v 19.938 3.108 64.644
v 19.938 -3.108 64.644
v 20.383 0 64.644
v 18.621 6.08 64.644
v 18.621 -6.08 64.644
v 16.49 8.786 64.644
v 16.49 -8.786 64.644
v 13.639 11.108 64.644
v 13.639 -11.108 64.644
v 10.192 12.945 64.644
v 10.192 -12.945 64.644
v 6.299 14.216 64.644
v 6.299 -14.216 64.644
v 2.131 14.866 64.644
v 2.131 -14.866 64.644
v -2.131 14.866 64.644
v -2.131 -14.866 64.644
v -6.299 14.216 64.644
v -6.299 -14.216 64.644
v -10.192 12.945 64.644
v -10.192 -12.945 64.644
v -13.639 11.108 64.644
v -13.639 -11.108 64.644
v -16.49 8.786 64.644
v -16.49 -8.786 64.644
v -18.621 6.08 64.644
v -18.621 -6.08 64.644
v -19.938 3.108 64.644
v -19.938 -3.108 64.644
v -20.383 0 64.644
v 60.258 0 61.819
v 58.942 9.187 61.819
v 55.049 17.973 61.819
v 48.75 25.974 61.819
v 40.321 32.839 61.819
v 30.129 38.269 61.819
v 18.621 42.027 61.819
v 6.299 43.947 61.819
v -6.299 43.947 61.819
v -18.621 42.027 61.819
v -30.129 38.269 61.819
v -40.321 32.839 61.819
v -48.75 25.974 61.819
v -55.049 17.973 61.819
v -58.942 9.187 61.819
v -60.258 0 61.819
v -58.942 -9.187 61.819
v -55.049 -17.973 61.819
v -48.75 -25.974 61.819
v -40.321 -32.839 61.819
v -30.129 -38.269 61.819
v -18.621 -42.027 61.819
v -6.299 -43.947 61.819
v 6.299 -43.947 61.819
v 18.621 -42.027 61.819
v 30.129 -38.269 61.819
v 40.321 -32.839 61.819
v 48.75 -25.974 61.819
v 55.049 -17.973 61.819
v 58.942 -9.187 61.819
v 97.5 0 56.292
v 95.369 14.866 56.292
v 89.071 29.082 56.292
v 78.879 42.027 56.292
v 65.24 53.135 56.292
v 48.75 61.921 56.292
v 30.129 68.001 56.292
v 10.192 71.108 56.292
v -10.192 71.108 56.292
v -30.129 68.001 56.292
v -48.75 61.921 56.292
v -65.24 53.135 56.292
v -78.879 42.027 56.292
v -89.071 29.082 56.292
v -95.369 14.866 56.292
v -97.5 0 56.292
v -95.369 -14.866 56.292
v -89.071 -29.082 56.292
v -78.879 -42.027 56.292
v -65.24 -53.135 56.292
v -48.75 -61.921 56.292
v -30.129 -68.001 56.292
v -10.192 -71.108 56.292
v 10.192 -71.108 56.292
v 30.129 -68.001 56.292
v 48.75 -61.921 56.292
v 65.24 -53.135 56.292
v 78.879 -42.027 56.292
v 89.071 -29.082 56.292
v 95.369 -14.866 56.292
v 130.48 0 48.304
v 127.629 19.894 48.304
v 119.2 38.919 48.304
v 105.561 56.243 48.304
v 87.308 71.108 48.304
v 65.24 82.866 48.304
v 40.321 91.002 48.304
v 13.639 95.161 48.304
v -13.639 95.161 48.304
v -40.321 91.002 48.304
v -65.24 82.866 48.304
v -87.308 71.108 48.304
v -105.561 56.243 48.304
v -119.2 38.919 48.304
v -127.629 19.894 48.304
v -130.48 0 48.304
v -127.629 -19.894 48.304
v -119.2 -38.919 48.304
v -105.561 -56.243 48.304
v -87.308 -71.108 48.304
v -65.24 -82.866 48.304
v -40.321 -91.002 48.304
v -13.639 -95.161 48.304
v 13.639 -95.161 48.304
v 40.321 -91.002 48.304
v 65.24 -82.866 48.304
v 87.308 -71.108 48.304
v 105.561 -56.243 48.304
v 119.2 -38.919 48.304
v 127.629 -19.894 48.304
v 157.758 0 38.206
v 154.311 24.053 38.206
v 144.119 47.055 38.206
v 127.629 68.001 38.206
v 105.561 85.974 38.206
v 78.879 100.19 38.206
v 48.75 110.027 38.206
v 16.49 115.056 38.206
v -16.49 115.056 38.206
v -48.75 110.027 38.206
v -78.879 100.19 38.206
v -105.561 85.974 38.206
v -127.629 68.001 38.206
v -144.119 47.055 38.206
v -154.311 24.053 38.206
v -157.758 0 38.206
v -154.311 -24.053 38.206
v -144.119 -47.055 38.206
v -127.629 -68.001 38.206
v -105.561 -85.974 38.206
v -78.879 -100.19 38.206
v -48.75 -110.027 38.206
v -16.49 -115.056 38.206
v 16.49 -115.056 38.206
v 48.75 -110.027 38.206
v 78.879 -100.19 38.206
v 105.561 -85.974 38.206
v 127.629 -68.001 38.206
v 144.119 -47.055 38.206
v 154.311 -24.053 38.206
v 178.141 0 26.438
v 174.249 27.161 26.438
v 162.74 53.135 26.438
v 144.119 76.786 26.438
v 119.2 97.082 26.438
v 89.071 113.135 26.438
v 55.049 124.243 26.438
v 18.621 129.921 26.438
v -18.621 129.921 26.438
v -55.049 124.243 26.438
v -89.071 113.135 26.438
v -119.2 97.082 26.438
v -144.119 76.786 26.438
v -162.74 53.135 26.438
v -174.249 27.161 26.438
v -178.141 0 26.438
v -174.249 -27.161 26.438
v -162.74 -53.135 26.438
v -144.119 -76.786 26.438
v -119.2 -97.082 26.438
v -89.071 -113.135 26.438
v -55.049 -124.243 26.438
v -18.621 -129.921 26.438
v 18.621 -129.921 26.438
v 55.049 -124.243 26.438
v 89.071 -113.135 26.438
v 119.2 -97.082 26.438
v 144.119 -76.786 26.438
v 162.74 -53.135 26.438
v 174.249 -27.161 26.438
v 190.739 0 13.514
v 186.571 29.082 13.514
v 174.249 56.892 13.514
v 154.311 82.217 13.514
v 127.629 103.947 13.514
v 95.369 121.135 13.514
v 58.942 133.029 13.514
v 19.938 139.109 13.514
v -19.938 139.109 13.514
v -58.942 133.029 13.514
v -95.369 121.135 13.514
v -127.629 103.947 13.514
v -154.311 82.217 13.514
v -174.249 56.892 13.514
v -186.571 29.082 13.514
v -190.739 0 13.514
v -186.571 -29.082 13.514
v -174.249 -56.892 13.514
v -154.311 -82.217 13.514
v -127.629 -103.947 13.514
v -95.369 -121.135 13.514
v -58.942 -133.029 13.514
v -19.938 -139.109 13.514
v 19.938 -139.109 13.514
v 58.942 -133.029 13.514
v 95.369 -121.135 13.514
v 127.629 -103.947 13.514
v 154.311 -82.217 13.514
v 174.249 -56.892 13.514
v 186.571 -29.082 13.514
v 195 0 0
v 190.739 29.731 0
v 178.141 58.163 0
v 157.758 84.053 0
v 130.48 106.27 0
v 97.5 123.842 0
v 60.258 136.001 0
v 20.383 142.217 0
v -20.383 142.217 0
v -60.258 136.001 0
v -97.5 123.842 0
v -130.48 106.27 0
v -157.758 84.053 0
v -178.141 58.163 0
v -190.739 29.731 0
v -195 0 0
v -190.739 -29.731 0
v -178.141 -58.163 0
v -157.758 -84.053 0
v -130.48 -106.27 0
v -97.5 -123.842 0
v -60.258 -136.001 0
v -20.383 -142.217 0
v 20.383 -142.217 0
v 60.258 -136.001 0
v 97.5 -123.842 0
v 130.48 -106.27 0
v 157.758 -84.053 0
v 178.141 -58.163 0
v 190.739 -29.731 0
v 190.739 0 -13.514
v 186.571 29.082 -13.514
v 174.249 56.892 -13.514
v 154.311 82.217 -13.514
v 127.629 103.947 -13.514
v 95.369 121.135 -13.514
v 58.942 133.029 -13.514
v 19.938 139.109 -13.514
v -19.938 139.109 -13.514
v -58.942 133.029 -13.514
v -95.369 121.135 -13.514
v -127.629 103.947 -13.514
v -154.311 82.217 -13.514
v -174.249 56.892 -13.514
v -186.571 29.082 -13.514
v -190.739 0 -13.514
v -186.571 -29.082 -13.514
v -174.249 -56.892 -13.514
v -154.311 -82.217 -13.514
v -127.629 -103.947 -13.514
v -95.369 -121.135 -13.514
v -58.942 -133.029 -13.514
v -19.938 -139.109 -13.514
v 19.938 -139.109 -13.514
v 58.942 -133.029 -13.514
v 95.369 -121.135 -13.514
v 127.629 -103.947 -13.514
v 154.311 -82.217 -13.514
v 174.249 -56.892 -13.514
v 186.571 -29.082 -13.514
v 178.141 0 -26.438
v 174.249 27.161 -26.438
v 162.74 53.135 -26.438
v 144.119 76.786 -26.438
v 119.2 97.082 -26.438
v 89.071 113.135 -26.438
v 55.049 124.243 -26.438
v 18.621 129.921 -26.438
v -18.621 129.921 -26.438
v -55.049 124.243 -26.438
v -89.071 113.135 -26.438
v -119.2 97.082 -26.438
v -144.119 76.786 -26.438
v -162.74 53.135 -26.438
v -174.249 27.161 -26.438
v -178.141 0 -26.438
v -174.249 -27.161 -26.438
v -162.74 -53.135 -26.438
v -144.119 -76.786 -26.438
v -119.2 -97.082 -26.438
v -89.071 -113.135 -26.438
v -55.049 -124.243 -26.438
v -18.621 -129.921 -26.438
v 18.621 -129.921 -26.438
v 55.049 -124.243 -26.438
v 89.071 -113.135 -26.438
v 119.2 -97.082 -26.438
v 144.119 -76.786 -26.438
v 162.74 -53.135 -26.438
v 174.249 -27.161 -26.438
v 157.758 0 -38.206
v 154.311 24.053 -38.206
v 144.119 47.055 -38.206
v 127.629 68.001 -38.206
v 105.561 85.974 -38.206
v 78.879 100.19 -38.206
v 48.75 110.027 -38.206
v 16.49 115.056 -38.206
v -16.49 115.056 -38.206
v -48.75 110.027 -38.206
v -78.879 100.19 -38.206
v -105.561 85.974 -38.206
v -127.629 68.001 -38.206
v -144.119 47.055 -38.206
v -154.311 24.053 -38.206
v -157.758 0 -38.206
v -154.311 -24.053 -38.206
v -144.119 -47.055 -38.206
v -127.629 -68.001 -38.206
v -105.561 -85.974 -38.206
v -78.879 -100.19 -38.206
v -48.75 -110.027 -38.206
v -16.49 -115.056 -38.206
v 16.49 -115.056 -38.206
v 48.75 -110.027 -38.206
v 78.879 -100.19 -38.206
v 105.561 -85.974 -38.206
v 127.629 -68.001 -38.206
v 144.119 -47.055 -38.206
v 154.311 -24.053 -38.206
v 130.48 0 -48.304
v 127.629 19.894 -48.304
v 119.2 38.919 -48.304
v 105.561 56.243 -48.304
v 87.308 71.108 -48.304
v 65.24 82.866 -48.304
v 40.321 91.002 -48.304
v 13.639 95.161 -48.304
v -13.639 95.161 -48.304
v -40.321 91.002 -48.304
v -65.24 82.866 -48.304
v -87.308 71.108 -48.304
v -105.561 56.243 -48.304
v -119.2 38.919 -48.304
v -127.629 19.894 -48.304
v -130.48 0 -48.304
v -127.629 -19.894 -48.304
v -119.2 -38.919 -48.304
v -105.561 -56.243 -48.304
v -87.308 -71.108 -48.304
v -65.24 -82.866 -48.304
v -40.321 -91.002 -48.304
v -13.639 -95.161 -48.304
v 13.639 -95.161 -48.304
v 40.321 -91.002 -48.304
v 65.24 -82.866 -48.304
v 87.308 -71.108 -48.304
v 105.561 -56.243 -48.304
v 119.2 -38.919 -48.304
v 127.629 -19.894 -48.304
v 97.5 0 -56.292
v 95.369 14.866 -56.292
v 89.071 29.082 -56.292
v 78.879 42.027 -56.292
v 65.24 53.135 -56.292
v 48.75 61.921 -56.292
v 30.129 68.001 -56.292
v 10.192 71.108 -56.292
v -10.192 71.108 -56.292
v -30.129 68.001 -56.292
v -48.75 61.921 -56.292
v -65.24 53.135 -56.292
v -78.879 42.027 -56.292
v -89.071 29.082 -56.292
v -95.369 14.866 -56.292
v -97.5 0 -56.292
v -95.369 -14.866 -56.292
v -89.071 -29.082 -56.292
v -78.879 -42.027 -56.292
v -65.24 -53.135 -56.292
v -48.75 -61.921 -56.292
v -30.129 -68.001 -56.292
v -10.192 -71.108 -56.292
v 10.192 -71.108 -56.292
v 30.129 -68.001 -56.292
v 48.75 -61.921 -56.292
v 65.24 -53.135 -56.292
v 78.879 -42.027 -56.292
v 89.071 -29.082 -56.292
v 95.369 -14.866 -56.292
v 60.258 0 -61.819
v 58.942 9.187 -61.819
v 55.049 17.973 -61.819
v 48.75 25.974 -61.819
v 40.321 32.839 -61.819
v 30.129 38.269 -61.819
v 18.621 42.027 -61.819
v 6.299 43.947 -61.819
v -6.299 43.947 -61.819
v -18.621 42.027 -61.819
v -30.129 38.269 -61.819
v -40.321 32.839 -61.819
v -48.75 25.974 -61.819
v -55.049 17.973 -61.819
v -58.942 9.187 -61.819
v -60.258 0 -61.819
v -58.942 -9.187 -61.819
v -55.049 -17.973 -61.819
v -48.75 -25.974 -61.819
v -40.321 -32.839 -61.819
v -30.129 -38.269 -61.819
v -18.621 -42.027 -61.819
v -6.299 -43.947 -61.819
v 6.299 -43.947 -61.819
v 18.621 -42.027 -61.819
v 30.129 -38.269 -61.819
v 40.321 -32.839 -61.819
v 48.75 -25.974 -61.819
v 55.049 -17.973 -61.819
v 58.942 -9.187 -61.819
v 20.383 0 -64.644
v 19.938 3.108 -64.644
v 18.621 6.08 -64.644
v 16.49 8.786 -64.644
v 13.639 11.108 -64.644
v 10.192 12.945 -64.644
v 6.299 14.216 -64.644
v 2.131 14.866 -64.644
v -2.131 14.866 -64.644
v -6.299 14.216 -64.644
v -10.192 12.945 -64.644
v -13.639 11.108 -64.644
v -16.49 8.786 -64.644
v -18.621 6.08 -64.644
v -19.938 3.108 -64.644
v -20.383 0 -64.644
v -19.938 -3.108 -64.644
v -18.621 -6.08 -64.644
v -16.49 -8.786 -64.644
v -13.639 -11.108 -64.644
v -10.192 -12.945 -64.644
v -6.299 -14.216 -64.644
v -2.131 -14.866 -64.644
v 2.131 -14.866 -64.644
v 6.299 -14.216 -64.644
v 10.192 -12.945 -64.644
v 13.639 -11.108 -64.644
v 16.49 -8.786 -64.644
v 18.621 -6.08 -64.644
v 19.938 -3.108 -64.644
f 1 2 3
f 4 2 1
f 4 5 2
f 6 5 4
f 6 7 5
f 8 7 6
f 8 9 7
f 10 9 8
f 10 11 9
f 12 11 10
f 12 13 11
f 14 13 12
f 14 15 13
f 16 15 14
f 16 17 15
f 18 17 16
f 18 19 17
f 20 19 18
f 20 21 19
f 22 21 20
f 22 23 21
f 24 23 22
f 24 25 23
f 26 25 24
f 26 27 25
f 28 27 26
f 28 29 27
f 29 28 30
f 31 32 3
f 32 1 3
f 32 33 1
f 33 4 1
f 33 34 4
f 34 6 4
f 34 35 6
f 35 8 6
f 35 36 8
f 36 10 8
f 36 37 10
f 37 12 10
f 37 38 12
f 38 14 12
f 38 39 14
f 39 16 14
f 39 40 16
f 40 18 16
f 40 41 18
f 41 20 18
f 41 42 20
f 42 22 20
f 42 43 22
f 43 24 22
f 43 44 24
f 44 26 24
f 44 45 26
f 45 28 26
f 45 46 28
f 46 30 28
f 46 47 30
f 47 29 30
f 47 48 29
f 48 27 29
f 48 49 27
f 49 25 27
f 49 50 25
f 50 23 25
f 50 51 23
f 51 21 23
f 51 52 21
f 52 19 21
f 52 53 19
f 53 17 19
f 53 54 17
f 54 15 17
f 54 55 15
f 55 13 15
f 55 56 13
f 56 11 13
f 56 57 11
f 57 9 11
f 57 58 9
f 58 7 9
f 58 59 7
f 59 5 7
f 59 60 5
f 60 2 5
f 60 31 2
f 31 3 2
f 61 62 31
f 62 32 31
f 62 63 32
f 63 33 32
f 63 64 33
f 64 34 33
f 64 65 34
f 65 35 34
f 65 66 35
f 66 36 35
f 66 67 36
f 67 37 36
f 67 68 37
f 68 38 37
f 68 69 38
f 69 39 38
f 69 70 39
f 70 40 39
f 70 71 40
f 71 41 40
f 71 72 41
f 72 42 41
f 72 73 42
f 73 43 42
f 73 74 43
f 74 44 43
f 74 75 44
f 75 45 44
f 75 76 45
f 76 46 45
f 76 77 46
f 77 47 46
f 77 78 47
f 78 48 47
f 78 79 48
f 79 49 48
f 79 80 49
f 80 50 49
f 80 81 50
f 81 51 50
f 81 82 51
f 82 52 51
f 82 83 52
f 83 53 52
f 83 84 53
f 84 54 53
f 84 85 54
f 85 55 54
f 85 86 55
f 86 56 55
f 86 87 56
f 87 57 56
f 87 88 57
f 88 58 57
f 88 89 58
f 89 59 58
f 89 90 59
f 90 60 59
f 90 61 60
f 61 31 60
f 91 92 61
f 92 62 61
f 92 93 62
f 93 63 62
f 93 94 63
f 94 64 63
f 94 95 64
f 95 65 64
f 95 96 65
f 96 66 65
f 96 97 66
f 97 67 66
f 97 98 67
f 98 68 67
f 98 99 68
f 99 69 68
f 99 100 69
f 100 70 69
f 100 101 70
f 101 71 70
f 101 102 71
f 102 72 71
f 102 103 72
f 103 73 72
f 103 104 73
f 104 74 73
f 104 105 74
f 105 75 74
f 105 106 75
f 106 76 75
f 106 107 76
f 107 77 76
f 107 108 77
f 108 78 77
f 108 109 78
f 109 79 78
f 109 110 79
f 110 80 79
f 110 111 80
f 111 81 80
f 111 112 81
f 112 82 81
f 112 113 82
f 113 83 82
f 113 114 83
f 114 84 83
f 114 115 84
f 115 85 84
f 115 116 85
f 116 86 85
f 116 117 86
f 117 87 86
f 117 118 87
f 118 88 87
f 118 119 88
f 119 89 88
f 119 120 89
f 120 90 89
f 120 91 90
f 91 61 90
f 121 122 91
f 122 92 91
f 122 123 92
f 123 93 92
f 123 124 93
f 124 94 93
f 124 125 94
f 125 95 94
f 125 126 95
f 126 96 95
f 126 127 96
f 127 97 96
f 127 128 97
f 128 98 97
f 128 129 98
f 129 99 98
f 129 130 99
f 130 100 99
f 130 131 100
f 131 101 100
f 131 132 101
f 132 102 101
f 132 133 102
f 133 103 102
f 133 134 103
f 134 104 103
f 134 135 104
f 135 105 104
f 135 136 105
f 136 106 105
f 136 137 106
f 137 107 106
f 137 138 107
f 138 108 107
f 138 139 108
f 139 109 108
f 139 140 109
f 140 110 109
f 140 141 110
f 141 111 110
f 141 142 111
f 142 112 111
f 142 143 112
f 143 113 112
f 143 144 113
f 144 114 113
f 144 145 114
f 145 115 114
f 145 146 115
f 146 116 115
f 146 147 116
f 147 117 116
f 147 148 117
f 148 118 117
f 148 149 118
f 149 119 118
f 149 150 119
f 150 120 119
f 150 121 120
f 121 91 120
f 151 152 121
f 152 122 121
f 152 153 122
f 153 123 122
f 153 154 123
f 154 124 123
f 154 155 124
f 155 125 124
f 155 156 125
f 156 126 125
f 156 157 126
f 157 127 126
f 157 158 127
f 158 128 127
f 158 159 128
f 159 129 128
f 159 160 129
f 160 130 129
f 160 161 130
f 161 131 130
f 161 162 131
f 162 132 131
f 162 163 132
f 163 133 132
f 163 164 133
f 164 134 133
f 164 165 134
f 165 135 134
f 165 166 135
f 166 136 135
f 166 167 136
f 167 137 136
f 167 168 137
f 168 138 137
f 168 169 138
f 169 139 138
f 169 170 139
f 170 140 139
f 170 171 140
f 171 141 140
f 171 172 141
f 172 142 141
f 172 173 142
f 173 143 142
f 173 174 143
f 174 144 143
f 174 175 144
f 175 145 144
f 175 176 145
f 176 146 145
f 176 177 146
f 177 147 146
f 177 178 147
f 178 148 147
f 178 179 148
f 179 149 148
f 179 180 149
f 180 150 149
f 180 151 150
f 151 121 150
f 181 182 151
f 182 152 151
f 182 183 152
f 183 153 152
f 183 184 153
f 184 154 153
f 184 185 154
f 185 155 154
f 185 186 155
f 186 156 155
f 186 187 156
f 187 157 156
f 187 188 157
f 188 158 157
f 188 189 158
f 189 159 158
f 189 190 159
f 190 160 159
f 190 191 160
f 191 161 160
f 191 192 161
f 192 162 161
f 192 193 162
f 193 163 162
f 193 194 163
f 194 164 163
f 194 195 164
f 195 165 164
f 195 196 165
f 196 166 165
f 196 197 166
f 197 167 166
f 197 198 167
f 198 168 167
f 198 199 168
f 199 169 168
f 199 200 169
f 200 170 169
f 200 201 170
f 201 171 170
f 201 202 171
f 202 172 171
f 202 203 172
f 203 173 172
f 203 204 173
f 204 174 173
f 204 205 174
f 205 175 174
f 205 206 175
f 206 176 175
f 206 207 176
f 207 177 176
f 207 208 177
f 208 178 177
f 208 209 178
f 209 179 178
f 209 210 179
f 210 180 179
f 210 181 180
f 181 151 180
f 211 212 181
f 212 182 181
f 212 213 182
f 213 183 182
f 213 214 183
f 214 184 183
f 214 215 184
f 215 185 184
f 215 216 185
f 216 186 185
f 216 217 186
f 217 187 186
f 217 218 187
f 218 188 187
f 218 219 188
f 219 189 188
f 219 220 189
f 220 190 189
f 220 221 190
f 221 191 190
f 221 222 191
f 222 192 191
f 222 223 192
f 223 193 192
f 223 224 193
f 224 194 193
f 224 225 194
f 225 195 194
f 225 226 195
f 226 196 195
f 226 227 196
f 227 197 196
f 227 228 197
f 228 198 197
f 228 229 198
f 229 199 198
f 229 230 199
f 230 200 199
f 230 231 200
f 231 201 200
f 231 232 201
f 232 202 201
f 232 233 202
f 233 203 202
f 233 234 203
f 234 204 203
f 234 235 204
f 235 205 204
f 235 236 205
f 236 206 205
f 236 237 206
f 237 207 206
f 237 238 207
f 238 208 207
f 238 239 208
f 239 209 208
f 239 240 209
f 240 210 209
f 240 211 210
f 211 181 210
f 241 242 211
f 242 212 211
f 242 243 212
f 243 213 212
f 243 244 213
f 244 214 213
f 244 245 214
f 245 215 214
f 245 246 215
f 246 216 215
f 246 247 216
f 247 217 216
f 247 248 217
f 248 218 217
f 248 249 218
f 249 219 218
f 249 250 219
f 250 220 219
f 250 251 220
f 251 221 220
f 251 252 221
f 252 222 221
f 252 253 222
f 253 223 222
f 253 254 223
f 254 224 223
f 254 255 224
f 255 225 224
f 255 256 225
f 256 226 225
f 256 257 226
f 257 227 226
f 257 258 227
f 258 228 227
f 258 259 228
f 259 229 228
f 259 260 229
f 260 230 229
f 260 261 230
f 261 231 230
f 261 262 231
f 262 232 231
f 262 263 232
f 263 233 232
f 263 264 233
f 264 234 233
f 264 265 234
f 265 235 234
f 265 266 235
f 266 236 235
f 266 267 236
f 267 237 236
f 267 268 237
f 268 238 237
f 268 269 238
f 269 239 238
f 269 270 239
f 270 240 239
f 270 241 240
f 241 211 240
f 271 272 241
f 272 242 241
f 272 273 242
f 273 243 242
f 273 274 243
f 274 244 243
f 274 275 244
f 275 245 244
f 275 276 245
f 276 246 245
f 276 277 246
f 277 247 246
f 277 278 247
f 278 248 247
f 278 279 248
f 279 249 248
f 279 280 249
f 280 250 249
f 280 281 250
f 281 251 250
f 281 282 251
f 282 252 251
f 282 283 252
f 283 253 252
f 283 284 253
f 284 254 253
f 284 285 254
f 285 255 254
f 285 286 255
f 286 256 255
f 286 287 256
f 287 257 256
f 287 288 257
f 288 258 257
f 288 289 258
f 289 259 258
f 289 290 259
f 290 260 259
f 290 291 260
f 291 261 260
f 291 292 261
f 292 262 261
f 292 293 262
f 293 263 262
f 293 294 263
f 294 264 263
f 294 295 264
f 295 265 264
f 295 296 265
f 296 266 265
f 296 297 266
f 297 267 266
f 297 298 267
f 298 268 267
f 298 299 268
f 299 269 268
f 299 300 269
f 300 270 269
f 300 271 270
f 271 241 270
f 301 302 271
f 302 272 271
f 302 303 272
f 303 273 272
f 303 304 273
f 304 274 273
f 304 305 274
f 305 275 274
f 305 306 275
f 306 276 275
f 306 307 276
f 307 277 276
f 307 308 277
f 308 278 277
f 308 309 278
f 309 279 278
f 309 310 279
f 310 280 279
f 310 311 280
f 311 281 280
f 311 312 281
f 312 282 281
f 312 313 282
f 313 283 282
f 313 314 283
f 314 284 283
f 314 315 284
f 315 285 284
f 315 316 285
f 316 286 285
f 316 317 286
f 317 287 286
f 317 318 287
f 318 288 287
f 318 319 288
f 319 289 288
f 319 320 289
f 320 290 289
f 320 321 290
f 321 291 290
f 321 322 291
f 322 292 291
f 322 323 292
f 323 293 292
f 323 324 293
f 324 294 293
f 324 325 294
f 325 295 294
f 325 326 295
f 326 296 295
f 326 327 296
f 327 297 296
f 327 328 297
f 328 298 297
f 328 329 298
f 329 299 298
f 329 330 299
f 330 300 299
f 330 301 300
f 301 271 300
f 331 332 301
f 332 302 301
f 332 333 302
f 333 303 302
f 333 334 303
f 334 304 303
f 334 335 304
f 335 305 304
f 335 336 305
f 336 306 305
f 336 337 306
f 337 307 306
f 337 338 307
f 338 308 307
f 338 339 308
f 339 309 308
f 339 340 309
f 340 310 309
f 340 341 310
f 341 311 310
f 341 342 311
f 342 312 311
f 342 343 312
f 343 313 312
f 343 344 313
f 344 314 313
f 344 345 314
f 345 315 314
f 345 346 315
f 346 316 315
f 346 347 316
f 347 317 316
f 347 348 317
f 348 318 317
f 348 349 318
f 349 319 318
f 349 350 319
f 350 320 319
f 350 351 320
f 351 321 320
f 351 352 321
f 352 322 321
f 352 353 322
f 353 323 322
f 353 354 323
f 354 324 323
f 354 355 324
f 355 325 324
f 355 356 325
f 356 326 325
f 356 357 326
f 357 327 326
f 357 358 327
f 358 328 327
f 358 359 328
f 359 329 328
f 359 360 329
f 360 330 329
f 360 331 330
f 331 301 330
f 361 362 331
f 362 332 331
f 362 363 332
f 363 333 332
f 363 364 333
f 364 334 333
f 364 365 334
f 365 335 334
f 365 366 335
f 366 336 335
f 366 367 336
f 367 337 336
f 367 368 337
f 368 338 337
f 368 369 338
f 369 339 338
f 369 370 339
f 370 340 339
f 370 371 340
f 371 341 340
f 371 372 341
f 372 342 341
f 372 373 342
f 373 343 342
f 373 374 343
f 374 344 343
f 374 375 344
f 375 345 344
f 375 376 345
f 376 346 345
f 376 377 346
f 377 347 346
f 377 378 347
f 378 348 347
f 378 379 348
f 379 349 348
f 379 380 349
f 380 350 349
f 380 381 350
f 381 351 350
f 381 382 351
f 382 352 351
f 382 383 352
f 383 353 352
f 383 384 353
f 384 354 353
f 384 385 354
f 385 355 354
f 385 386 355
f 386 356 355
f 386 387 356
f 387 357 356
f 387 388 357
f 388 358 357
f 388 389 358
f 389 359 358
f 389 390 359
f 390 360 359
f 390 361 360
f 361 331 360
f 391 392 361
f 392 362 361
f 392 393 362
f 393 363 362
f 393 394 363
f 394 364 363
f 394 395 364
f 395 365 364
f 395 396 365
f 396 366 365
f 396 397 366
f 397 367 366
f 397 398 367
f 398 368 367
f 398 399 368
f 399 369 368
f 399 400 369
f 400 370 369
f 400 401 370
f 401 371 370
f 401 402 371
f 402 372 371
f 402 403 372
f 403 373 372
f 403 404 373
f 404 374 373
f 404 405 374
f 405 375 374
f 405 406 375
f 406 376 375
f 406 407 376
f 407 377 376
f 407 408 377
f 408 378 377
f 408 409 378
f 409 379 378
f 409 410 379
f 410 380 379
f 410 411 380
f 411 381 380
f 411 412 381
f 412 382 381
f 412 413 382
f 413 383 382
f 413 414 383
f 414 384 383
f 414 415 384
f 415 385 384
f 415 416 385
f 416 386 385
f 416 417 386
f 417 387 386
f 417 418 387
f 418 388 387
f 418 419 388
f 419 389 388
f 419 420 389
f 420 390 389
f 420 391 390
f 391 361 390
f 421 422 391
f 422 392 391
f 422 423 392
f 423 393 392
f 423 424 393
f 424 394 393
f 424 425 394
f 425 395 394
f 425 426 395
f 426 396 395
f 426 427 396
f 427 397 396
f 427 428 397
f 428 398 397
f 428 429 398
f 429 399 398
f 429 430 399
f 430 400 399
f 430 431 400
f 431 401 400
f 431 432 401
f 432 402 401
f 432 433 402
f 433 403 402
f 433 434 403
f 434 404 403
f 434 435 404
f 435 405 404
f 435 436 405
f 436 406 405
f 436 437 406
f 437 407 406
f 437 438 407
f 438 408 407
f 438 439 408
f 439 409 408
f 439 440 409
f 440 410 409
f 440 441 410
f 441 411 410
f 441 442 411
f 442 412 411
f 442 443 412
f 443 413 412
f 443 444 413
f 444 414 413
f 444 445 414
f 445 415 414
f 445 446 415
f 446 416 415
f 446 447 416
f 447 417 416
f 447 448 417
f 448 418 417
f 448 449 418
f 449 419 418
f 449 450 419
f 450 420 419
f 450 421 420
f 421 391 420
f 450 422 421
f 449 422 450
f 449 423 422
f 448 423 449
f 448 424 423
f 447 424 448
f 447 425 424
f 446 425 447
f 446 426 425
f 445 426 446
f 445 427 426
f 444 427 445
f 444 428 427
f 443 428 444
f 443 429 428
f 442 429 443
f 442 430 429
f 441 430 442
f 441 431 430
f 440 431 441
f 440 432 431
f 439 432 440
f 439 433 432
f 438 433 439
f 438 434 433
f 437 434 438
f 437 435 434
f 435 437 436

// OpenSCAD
// Generated by SolidPython 1.0.1 on 2020-07-29 00:46:52


scale(v = [15, 11, 5]) {
	sphere(r = 13);
}
/***********************************************
*********      SolidPython code:      **********
************************************************
 
# import packages: SolidPython
from solid import *
from solid.utils import *
from itertools import chain, combinations, permutations


class Resize:

    def __init__(self, scad_file):
        self.scad_file = scad_file
        #self.scad_file = import_scad(scad_file)
        # cone/cylinder param:
        self.r1 = 0
        self.r2 = 0
        self.h = 0
        # rectangular prism param:
        self.w = 0
        self.l = 0
        # ellipse param:
        self.r = 0

    # import OpenScad code (file name corresponds to shape)


    # classify shape + parameters
    def assign(self, param1, param2, param3):
        if self.scad_file == 'cone.scad':
            self.r1 = param1
            self.r2 = param2
            self.h = param3
        elif self.scad_file == 'cylinder.scad':
            self.r1 = param1
            self.r2 = param2
            self.h = param3
        elif self.scad_file == 'rectangularPrism.scad':
            self.h = param1
            self.l = param2
            self.w = param3
        else:
            self.r = param1
            self.h = param2

    # resize parameters
    def iterate(self):
        x = range(3, 20, 2)
        i = 1
        if self.scad_file == 'cone.scad':
            tempList = list(permutations(x, 2))
            for temp in tempList:
                param1 = temp[0]
                param2 = temp[1]
                filepath = 'produced_scad_files/' + 'cone' + str(param1) + '_' + str(param2) + '_' + '.scad'
                scad_render_to_file(cylinder(h=param1, r1=param2, r2=0), filepath)

        elif self.scad_file == 'cylinder.scad':
            tempList = list(permutations(x, 3))
            for temp in tempList:
                param1 = temp[0]
                param2 = temp[1]
                filepath = 'produced_scad_files/' + 'cylinder' + str(param1) + '_' + str(param2) + '_' + '.scad'
                scad_render_to_file(cylinder(h=param1, r1=param2, r2=param2), filepath)

        elif self.scad_file == 'rectangularPrism.scad':
            tempList = list(permutations(x, 3))
            for temp in tempList:
                param1 = temp[0]
                param2 = temp[1]
                param3 = temp[2]
                filepath = 'produced_scad_files/' + 'rectangularPrism' + str(param1) + '_' + str(param2) + '_' + str(
                    param3) + '.scad'
                scad_render_to_file(cube(size=(param1, param2, param3)), filepath)

        elif self.scad_file == 'ellipse.scad':
            tempList = list(permutations(x, 4))
            for temp in tempList:
                param1 = temp[0]
                param2 = temp[1]
                param3 = temp[2]
                param4 = temp[3]
                filepath = 'produced_scad_files/' + 'ellipse' + str(param1) + '_' + str(param2) + '_' + str(param3) + '_' + str(param4) + '.scad'
                scad_render_to_file(scale([param1, param2, param3])(sphere(r=param4)), filepath)

    def render_to_scadfile(self):
        scad_render_to_file(scad, 'example.scad') 
 
************************************************/
